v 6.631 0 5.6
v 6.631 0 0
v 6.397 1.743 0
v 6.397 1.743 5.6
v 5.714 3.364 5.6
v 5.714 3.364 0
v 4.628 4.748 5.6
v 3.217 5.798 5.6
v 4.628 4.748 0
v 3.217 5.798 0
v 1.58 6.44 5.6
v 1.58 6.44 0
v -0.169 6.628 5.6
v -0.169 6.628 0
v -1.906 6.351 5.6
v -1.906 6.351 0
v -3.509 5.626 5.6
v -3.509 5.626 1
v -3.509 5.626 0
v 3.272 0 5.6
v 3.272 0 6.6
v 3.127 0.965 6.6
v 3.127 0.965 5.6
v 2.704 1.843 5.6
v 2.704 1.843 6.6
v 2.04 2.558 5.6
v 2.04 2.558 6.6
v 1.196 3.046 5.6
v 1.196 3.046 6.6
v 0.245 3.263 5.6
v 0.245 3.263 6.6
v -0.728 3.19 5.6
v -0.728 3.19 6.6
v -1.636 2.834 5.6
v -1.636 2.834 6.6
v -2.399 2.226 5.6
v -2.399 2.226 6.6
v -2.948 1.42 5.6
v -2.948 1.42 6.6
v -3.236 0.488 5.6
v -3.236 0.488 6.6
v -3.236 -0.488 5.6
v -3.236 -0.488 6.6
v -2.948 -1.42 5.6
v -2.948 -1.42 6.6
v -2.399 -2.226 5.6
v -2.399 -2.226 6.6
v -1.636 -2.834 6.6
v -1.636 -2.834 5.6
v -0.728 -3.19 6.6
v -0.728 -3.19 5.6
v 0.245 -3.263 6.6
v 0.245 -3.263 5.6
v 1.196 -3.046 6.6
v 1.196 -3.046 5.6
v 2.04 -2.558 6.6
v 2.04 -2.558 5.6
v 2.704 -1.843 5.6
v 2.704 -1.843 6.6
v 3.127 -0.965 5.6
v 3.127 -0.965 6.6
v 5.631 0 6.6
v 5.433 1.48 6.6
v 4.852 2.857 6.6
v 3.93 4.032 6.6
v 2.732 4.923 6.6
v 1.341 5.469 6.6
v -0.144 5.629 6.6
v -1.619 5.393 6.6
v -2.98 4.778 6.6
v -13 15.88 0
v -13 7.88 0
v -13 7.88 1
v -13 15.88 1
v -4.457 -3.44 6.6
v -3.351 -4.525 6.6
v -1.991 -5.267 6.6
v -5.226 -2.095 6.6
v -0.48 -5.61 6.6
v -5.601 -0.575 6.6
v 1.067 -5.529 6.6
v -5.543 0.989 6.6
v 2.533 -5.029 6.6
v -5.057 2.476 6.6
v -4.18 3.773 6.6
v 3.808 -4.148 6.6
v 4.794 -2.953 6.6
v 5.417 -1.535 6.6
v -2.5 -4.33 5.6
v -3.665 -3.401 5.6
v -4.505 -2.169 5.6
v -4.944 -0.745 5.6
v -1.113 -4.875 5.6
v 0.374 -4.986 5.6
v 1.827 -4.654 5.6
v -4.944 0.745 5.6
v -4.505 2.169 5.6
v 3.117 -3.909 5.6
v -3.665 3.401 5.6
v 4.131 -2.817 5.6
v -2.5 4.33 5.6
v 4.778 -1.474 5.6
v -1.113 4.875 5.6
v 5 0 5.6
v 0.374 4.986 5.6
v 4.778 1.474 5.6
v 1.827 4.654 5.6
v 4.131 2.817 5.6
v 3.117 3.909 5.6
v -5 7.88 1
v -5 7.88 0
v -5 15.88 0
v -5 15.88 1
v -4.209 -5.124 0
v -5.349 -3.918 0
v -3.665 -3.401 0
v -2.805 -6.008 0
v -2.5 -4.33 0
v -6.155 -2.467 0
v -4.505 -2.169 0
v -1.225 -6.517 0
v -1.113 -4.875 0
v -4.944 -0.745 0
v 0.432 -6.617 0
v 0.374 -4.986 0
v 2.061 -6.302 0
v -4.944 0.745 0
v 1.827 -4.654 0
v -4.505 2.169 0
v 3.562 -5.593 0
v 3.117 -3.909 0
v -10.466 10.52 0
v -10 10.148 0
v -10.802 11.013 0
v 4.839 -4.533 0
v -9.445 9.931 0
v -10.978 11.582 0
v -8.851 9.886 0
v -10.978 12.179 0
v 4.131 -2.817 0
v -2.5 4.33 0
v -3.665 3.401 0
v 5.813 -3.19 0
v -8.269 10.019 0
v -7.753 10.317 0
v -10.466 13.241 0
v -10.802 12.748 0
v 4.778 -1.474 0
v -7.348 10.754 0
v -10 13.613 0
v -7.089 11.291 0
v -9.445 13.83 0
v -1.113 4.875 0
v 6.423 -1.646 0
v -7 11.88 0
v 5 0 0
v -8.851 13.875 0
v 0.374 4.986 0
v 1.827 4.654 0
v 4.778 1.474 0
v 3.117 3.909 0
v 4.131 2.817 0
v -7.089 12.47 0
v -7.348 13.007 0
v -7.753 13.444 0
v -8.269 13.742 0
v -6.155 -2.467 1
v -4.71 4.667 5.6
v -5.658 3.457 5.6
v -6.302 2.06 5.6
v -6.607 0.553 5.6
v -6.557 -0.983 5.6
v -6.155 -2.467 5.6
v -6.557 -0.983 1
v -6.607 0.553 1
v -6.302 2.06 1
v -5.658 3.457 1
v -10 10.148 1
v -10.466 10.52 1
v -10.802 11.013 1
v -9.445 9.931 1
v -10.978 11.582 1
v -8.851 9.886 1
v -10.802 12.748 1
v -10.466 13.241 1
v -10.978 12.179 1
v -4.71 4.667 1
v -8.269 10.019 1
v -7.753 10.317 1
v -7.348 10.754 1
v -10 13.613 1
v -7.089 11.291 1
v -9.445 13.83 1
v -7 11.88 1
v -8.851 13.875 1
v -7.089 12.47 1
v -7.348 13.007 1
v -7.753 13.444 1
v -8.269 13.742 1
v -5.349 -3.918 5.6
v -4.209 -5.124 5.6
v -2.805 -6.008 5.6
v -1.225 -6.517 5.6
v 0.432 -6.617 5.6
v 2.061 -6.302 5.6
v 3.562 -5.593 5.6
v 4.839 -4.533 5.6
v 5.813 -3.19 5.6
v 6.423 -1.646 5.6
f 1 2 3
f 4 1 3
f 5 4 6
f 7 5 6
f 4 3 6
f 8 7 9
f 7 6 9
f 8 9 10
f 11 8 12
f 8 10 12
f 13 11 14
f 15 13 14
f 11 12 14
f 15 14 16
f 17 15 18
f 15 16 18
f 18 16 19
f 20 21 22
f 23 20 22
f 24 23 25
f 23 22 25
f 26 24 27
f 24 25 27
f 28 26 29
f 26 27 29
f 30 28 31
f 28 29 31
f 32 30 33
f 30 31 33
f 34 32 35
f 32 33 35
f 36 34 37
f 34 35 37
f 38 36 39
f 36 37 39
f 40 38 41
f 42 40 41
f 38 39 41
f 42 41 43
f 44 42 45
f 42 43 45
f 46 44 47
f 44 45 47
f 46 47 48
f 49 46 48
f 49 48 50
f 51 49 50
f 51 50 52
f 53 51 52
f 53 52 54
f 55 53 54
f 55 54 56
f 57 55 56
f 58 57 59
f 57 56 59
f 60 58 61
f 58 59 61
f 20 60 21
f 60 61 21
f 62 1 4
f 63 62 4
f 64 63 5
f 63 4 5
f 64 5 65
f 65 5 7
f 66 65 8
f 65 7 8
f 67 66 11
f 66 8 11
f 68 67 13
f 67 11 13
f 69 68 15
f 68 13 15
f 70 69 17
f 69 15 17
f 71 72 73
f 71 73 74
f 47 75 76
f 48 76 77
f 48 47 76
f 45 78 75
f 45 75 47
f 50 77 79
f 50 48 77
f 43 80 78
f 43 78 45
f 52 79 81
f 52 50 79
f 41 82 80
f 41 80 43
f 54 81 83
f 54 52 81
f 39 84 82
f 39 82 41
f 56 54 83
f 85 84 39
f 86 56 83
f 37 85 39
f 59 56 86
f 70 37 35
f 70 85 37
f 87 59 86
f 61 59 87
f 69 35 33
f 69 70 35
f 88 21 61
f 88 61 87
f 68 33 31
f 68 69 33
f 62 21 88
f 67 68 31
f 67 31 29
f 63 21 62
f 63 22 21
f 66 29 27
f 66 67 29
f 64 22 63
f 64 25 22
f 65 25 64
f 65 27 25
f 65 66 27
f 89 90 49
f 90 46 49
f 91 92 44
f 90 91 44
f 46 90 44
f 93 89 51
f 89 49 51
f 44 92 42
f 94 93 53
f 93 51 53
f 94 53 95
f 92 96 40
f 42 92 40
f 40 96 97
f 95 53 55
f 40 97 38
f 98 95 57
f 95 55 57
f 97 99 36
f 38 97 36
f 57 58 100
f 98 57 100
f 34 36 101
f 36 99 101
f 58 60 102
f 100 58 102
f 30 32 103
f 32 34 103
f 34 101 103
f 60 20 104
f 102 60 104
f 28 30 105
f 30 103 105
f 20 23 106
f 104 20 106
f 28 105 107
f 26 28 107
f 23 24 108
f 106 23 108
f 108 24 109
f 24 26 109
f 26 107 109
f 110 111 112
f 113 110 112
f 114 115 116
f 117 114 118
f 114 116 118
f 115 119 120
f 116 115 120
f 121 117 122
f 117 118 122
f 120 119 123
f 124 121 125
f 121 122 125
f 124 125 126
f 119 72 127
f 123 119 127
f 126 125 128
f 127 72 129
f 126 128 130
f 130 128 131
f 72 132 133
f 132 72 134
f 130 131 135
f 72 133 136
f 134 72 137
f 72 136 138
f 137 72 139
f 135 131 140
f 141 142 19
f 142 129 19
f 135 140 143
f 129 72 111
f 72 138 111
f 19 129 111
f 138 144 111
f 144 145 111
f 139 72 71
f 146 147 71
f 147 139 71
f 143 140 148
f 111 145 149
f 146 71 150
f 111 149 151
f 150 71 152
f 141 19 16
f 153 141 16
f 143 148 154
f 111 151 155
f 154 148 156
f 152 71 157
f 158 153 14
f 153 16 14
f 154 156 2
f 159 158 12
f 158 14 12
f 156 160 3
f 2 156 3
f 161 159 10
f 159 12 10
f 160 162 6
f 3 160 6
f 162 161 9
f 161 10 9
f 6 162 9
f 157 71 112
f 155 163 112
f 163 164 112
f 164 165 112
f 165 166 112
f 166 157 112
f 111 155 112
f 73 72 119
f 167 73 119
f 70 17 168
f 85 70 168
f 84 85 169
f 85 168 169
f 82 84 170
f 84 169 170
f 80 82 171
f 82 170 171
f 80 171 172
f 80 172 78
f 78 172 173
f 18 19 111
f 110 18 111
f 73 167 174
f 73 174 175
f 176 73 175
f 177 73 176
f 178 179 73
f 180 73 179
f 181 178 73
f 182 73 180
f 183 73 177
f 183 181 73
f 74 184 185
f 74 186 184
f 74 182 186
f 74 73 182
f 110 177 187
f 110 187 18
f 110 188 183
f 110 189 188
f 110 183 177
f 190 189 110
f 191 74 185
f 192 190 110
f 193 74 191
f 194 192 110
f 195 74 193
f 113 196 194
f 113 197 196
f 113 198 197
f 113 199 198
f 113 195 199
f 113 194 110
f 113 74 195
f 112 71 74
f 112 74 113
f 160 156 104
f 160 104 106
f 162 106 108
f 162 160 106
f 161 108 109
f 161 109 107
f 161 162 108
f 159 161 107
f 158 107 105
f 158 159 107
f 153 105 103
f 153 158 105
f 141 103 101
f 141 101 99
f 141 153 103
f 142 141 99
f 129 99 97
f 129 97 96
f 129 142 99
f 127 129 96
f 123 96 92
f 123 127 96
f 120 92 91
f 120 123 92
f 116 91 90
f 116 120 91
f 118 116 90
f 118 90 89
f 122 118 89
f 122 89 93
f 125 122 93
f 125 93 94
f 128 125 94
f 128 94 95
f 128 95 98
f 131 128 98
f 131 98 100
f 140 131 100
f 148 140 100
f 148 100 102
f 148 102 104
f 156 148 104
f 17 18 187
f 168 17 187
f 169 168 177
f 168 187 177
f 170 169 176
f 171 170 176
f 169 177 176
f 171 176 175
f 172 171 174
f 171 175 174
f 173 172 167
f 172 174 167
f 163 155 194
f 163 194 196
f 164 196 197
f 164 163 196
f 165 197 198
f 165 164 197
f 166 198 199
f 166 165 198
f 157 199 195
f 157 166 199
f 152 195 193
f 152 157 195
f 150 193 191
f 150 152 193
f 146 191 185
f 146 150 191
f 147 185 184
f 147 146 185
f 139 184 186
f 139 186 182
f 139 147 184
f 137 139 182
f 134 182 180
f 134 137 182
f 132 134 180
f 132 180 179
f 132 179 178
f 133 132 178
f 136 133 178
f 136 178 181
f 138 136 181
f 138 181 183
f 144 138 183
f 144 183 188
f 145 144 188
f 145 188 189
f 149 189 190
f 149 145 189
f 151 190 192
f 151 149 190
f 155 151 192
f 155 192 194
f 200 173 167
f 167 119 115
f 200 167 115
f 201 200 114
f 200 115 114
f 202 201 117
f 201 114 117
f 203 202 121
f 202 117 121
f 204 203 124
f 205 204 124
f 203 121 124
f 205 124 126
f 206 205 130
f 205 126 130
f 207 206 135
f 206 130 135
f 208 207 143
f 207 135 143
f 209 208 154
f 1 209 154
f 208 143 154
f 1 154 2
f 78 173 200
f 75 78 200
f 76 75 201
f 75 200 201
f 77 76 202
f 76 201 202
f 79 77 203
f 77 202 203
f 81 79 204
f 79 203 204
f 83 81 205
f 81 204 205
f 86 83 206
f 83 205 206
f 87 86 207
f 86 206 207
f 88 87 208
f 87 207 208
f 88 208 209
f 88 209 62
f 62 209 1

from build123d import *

# Parameters (mm, degrees)
F0_W     = 8
F0_H     = 8
F0_R     = 2
F1_DEPTH = 1
F0_R_2   = 5
F2_DEPTH = 6.6
F3_R     = 5
F3_R_2   = 3.272318
F4_DEPTH = 1
F5_SIZE  = 1


with BuildPart() as f1:
    # F0 (on Top) → F1 (new body)
    with BuildSketch(Plane.XY):
        with Locations((-9, 11.880489)):
            Rectangle(F0_W, F0_H)
        with Locations((-9, 11.880489)):
            Circle(F0_R, mode=Mode.SUBTRACT)
        with BuildLine():
            ThreePointArc((-6.154522, -2.467193), (-6.302399, 2.06033), (-3.508691, 5.626214))
            Line((-3.508691, 5.626214), (-5, 7.880489))
            Line((-5, 7.880489), (-13, 7.880489))
            Line((-13, 7.880489), (-6.154522, -2.467193))
        make_face()
    extrude(amount=F1_DEPTH)

    # F0 (on Top) → F2 (join)
    with BuildSketch(Plane.XY):
        with BuildLine():
            ThreePointArc((-6.154522, -2.467193), (1.256356, -6.510512), (6.630625, 0))
            ThreePointArc((6.630625, 0), (3.217171, 5.797845), (-3.508691, 5.626214))
            ThreePointArc((-3.508691, 5.626214), (-6.302399, 2.06033), (-6.154522, -2.467193))
        make_face()
        Circle(F0_R_2, mode=Mode.SUBTRACT)
    extrude(amount=F2_DEPTH)

    # F3 (on face) → F4 (join)
    with BuildSketch(Plane.XY.offset(6.6)):
        Circle(F3_R)
        Circle(F3_R_2, mode=Mode.SUBTRACT)
    extrude(amount=-F4_DEPTH)

    # F5
    f5_edges = [f1.edges().sort_by_distance(p)[0] for p in [
        (3.508691, -5.626214, 6.6),
    ]]
    chamfer(f5_edges, length=F5_SIZE)


solid = f1.part
